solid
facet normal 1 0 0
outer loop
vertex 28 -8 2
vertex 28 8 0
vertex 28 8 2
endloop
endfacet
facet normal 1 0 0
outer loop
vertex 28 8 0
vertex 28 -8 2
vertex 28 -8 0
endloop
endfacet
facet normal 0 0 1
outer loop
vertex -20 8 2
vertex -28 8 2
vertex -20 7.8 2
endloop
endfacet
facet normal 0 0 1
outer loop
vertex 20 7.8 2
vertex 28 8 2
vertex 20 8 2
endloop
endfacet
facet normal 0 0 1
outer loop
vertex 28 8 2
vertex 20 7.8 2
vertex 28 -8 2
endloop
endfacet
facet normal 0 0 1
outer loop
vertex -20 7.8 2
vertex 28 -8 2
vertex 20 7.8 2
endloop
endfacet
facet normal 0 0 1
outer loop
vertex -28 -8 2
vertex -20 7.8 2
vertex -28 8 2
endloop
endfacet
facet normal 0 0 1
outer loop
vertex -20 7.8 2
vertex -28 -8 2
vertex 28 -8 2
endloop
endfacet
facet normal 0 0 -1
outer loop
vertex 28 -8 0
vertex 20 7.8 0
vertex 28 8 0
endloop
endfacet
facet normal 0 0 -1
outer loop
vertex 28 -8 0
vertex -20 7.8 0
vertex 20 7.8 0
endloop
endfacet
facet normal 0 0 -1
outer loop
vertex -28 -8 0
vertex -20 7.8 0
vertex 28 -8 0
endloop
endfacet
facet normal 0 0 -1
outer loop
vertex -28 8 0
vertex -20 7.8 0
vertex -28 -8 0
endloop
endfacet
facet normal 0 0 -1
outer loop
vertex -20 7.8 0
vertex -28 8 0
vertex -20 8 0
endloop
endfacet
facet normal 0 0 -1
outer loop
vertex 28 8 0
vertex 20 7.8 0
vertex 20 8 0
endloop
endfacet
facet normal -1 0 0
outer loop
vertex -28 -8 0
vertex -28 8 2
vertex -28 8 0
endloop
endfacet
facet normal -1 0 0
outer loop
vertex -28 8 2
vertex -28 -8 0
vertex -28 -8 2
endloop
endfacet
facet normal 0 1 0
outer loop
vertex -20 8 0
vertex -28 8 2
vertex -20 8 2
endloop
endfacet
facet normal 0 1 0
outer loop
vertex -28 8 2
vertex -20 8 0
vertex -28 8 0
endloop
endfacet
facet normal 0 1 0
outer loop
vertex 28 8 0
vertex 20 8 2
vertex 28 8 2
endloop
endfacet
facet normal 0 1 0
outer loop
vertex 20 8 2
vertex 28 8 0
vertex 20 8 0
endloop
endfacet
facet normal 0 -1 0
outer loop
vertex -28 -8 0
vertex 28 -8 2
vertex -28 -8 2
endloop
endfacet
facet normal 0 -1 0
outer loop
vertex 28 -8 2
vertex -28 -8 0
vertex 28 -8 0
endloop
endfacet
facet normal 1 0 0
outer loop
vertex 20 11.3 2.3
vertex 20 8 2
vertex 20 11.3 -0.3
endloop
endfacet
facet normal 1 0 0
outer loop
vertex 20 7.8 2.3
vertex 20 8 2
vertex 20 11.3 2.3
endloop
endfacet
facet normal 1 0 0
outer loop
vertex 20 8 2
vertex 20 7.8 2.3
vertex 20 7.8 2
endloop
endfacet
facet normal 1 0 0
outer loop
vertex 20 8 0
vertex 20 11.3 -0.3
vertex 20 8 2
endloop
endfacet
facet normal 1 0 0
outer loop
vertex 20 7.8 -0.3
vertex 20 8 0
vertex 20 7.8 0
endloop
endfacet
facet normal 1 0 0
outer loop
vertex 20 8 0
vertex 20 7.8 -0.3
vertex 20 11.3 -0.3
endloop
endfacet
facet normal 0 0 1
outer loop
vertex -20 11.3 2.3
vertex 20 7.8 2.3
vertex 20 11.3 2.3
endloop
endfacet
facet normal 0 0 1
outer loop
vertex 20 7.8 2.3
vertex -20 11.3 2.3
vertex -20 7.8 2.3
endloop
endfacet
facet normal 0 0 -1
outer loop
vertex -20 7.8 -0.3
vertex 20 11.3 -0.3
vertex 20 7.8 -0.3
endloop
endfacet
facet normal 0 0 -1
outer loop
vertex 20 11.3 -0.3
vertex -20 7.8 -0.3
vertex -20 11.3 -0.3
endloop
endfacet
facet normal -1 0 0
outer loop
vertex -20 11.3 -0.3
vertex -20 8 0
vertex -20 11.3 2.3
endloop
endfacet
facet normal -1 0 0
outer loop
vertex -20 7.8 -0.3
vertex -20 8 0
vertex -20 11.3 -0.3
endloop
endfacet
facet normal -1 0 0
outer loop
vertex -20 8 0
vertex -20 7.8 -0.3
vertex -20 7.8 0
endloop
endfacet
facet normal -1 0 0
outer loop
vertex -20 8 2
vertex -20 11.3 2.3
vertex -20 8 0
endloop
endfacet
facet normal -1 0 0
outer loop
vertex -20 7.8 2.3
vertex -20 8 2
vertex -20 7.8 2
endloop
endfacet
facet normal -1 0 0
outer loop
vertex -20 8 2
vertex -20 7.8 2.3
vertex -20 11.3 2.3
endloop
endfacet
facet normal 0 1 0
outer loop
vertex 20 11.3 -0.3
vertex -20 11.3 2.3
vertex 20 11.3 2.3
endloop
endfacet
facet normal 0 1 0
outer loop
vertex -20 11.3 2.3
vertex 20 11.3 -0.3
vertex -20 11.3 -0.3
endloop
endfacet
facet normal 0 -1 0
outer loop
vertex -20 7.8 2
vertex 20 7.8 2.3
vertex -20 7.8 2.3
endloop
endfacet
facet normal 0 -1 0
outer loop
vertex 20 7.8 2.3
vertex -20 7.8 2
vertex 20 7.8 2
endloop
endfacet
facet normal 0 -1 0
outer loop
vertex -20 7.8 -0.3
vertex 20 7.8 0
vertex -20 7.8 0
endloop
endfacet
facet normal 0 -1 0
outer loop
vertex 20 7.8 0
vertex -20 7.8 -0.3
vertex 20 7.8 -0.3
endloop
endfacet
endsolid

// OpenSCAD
// file: starship_display_stand.scad
// Desk stand + blank nameplate for the 1:200 nose-up Starship print.
// Ship skirt ≈ Ø45.0 mm; engines flush with Z=0.
//
// Part = "stand" | "nameplate" | "both"
// Export wrappers: openscad/export_display_stand.scad, export_nameplate.scad

Part = "both"; // [stand, nameplate, both]

$fa = 1;
$fs = 0.4;

// ---- stand (ring cradle) ----
ship_od     = 45.0;   // measured mid-barrel / skirt OD at 1:200
clearance   = 0.6;    // radial slip fit
inner_d     = ship_od + clearance * 2; // ~46.2
outer_d     = 66;
stand_h     = 10;
recess_d    = 2.2;    // how deep the skirt sits into the ring
wall_t      = (outer_d - inner_d) / 2;
rib_n       = 4;
rib_w       = 2.4;
rib_in      = 1.2;    // ribs poke inward from the ring ID

module stand_ring() {
  difference() {
    // Outer body
    cylinder(h = stand_h, d = outer_d, center = false);
    // Main bore — ship drops in from above
    translate([0, 0, recess_d])
      cylinder(h = stand_h + 1, d = inner_d, center = false);
    // Through-hole so engines / skirt can be seen from below (slightly smaller)
    translate([0, 0, -0.1])
      cylinder(h = recess_d + 0.2, d = inner_d - 3.0, center = false);
    // Nameplate dovetail pocket on +Y face
    translate([0, outer_d / 2 - 1.2, stand_h / 2])
      rotate([90, 0, 0])
        cube([42, 3.2, 4], center = true);
  }
  // Anti-spin ribs on the floor of the recess
  for (i = [0:rib_n - 1]) {
    rotate([0, 0, i * 360 / rib_n + 20])
      translate([inner_d / 2 - rib_in / 2 - 0.2, 0, recess_d / 2])
        cube([rib_in + 0.8, rib_w, recess_d], center = true);
  }
}

// ---- blank nameplate (slot into stand front) ----
plate_w = 56;
plate_h = 16;
plate_t = 2.0;
tab_w   = 40;
tab_t   = 2.6;
tab_d   = 3.5;

module nameplate() {
  union() {
    // Face
    translate([0, 0, plate_t / 2])
      cube([plate_w, plate_h, plate_t], center = true);
    // Tab that slides into the stand pocket
    translate([0, plate_h / 2 + tab_d / 2 - 0.2, plate_t / 2])
      cube([tab_w, tab_d, tab_t], center = true);
  }
}

if (Part == "stand") stand_ring();
else if (Part == "nameplate") nameplate();
else {
  stand_ring();
  translate([0, outer_d / 2 + 18, 0]) nameplate();
}
// main file
include <starship_display_stand.scad>
Part = "nameplate";
nameplate();
